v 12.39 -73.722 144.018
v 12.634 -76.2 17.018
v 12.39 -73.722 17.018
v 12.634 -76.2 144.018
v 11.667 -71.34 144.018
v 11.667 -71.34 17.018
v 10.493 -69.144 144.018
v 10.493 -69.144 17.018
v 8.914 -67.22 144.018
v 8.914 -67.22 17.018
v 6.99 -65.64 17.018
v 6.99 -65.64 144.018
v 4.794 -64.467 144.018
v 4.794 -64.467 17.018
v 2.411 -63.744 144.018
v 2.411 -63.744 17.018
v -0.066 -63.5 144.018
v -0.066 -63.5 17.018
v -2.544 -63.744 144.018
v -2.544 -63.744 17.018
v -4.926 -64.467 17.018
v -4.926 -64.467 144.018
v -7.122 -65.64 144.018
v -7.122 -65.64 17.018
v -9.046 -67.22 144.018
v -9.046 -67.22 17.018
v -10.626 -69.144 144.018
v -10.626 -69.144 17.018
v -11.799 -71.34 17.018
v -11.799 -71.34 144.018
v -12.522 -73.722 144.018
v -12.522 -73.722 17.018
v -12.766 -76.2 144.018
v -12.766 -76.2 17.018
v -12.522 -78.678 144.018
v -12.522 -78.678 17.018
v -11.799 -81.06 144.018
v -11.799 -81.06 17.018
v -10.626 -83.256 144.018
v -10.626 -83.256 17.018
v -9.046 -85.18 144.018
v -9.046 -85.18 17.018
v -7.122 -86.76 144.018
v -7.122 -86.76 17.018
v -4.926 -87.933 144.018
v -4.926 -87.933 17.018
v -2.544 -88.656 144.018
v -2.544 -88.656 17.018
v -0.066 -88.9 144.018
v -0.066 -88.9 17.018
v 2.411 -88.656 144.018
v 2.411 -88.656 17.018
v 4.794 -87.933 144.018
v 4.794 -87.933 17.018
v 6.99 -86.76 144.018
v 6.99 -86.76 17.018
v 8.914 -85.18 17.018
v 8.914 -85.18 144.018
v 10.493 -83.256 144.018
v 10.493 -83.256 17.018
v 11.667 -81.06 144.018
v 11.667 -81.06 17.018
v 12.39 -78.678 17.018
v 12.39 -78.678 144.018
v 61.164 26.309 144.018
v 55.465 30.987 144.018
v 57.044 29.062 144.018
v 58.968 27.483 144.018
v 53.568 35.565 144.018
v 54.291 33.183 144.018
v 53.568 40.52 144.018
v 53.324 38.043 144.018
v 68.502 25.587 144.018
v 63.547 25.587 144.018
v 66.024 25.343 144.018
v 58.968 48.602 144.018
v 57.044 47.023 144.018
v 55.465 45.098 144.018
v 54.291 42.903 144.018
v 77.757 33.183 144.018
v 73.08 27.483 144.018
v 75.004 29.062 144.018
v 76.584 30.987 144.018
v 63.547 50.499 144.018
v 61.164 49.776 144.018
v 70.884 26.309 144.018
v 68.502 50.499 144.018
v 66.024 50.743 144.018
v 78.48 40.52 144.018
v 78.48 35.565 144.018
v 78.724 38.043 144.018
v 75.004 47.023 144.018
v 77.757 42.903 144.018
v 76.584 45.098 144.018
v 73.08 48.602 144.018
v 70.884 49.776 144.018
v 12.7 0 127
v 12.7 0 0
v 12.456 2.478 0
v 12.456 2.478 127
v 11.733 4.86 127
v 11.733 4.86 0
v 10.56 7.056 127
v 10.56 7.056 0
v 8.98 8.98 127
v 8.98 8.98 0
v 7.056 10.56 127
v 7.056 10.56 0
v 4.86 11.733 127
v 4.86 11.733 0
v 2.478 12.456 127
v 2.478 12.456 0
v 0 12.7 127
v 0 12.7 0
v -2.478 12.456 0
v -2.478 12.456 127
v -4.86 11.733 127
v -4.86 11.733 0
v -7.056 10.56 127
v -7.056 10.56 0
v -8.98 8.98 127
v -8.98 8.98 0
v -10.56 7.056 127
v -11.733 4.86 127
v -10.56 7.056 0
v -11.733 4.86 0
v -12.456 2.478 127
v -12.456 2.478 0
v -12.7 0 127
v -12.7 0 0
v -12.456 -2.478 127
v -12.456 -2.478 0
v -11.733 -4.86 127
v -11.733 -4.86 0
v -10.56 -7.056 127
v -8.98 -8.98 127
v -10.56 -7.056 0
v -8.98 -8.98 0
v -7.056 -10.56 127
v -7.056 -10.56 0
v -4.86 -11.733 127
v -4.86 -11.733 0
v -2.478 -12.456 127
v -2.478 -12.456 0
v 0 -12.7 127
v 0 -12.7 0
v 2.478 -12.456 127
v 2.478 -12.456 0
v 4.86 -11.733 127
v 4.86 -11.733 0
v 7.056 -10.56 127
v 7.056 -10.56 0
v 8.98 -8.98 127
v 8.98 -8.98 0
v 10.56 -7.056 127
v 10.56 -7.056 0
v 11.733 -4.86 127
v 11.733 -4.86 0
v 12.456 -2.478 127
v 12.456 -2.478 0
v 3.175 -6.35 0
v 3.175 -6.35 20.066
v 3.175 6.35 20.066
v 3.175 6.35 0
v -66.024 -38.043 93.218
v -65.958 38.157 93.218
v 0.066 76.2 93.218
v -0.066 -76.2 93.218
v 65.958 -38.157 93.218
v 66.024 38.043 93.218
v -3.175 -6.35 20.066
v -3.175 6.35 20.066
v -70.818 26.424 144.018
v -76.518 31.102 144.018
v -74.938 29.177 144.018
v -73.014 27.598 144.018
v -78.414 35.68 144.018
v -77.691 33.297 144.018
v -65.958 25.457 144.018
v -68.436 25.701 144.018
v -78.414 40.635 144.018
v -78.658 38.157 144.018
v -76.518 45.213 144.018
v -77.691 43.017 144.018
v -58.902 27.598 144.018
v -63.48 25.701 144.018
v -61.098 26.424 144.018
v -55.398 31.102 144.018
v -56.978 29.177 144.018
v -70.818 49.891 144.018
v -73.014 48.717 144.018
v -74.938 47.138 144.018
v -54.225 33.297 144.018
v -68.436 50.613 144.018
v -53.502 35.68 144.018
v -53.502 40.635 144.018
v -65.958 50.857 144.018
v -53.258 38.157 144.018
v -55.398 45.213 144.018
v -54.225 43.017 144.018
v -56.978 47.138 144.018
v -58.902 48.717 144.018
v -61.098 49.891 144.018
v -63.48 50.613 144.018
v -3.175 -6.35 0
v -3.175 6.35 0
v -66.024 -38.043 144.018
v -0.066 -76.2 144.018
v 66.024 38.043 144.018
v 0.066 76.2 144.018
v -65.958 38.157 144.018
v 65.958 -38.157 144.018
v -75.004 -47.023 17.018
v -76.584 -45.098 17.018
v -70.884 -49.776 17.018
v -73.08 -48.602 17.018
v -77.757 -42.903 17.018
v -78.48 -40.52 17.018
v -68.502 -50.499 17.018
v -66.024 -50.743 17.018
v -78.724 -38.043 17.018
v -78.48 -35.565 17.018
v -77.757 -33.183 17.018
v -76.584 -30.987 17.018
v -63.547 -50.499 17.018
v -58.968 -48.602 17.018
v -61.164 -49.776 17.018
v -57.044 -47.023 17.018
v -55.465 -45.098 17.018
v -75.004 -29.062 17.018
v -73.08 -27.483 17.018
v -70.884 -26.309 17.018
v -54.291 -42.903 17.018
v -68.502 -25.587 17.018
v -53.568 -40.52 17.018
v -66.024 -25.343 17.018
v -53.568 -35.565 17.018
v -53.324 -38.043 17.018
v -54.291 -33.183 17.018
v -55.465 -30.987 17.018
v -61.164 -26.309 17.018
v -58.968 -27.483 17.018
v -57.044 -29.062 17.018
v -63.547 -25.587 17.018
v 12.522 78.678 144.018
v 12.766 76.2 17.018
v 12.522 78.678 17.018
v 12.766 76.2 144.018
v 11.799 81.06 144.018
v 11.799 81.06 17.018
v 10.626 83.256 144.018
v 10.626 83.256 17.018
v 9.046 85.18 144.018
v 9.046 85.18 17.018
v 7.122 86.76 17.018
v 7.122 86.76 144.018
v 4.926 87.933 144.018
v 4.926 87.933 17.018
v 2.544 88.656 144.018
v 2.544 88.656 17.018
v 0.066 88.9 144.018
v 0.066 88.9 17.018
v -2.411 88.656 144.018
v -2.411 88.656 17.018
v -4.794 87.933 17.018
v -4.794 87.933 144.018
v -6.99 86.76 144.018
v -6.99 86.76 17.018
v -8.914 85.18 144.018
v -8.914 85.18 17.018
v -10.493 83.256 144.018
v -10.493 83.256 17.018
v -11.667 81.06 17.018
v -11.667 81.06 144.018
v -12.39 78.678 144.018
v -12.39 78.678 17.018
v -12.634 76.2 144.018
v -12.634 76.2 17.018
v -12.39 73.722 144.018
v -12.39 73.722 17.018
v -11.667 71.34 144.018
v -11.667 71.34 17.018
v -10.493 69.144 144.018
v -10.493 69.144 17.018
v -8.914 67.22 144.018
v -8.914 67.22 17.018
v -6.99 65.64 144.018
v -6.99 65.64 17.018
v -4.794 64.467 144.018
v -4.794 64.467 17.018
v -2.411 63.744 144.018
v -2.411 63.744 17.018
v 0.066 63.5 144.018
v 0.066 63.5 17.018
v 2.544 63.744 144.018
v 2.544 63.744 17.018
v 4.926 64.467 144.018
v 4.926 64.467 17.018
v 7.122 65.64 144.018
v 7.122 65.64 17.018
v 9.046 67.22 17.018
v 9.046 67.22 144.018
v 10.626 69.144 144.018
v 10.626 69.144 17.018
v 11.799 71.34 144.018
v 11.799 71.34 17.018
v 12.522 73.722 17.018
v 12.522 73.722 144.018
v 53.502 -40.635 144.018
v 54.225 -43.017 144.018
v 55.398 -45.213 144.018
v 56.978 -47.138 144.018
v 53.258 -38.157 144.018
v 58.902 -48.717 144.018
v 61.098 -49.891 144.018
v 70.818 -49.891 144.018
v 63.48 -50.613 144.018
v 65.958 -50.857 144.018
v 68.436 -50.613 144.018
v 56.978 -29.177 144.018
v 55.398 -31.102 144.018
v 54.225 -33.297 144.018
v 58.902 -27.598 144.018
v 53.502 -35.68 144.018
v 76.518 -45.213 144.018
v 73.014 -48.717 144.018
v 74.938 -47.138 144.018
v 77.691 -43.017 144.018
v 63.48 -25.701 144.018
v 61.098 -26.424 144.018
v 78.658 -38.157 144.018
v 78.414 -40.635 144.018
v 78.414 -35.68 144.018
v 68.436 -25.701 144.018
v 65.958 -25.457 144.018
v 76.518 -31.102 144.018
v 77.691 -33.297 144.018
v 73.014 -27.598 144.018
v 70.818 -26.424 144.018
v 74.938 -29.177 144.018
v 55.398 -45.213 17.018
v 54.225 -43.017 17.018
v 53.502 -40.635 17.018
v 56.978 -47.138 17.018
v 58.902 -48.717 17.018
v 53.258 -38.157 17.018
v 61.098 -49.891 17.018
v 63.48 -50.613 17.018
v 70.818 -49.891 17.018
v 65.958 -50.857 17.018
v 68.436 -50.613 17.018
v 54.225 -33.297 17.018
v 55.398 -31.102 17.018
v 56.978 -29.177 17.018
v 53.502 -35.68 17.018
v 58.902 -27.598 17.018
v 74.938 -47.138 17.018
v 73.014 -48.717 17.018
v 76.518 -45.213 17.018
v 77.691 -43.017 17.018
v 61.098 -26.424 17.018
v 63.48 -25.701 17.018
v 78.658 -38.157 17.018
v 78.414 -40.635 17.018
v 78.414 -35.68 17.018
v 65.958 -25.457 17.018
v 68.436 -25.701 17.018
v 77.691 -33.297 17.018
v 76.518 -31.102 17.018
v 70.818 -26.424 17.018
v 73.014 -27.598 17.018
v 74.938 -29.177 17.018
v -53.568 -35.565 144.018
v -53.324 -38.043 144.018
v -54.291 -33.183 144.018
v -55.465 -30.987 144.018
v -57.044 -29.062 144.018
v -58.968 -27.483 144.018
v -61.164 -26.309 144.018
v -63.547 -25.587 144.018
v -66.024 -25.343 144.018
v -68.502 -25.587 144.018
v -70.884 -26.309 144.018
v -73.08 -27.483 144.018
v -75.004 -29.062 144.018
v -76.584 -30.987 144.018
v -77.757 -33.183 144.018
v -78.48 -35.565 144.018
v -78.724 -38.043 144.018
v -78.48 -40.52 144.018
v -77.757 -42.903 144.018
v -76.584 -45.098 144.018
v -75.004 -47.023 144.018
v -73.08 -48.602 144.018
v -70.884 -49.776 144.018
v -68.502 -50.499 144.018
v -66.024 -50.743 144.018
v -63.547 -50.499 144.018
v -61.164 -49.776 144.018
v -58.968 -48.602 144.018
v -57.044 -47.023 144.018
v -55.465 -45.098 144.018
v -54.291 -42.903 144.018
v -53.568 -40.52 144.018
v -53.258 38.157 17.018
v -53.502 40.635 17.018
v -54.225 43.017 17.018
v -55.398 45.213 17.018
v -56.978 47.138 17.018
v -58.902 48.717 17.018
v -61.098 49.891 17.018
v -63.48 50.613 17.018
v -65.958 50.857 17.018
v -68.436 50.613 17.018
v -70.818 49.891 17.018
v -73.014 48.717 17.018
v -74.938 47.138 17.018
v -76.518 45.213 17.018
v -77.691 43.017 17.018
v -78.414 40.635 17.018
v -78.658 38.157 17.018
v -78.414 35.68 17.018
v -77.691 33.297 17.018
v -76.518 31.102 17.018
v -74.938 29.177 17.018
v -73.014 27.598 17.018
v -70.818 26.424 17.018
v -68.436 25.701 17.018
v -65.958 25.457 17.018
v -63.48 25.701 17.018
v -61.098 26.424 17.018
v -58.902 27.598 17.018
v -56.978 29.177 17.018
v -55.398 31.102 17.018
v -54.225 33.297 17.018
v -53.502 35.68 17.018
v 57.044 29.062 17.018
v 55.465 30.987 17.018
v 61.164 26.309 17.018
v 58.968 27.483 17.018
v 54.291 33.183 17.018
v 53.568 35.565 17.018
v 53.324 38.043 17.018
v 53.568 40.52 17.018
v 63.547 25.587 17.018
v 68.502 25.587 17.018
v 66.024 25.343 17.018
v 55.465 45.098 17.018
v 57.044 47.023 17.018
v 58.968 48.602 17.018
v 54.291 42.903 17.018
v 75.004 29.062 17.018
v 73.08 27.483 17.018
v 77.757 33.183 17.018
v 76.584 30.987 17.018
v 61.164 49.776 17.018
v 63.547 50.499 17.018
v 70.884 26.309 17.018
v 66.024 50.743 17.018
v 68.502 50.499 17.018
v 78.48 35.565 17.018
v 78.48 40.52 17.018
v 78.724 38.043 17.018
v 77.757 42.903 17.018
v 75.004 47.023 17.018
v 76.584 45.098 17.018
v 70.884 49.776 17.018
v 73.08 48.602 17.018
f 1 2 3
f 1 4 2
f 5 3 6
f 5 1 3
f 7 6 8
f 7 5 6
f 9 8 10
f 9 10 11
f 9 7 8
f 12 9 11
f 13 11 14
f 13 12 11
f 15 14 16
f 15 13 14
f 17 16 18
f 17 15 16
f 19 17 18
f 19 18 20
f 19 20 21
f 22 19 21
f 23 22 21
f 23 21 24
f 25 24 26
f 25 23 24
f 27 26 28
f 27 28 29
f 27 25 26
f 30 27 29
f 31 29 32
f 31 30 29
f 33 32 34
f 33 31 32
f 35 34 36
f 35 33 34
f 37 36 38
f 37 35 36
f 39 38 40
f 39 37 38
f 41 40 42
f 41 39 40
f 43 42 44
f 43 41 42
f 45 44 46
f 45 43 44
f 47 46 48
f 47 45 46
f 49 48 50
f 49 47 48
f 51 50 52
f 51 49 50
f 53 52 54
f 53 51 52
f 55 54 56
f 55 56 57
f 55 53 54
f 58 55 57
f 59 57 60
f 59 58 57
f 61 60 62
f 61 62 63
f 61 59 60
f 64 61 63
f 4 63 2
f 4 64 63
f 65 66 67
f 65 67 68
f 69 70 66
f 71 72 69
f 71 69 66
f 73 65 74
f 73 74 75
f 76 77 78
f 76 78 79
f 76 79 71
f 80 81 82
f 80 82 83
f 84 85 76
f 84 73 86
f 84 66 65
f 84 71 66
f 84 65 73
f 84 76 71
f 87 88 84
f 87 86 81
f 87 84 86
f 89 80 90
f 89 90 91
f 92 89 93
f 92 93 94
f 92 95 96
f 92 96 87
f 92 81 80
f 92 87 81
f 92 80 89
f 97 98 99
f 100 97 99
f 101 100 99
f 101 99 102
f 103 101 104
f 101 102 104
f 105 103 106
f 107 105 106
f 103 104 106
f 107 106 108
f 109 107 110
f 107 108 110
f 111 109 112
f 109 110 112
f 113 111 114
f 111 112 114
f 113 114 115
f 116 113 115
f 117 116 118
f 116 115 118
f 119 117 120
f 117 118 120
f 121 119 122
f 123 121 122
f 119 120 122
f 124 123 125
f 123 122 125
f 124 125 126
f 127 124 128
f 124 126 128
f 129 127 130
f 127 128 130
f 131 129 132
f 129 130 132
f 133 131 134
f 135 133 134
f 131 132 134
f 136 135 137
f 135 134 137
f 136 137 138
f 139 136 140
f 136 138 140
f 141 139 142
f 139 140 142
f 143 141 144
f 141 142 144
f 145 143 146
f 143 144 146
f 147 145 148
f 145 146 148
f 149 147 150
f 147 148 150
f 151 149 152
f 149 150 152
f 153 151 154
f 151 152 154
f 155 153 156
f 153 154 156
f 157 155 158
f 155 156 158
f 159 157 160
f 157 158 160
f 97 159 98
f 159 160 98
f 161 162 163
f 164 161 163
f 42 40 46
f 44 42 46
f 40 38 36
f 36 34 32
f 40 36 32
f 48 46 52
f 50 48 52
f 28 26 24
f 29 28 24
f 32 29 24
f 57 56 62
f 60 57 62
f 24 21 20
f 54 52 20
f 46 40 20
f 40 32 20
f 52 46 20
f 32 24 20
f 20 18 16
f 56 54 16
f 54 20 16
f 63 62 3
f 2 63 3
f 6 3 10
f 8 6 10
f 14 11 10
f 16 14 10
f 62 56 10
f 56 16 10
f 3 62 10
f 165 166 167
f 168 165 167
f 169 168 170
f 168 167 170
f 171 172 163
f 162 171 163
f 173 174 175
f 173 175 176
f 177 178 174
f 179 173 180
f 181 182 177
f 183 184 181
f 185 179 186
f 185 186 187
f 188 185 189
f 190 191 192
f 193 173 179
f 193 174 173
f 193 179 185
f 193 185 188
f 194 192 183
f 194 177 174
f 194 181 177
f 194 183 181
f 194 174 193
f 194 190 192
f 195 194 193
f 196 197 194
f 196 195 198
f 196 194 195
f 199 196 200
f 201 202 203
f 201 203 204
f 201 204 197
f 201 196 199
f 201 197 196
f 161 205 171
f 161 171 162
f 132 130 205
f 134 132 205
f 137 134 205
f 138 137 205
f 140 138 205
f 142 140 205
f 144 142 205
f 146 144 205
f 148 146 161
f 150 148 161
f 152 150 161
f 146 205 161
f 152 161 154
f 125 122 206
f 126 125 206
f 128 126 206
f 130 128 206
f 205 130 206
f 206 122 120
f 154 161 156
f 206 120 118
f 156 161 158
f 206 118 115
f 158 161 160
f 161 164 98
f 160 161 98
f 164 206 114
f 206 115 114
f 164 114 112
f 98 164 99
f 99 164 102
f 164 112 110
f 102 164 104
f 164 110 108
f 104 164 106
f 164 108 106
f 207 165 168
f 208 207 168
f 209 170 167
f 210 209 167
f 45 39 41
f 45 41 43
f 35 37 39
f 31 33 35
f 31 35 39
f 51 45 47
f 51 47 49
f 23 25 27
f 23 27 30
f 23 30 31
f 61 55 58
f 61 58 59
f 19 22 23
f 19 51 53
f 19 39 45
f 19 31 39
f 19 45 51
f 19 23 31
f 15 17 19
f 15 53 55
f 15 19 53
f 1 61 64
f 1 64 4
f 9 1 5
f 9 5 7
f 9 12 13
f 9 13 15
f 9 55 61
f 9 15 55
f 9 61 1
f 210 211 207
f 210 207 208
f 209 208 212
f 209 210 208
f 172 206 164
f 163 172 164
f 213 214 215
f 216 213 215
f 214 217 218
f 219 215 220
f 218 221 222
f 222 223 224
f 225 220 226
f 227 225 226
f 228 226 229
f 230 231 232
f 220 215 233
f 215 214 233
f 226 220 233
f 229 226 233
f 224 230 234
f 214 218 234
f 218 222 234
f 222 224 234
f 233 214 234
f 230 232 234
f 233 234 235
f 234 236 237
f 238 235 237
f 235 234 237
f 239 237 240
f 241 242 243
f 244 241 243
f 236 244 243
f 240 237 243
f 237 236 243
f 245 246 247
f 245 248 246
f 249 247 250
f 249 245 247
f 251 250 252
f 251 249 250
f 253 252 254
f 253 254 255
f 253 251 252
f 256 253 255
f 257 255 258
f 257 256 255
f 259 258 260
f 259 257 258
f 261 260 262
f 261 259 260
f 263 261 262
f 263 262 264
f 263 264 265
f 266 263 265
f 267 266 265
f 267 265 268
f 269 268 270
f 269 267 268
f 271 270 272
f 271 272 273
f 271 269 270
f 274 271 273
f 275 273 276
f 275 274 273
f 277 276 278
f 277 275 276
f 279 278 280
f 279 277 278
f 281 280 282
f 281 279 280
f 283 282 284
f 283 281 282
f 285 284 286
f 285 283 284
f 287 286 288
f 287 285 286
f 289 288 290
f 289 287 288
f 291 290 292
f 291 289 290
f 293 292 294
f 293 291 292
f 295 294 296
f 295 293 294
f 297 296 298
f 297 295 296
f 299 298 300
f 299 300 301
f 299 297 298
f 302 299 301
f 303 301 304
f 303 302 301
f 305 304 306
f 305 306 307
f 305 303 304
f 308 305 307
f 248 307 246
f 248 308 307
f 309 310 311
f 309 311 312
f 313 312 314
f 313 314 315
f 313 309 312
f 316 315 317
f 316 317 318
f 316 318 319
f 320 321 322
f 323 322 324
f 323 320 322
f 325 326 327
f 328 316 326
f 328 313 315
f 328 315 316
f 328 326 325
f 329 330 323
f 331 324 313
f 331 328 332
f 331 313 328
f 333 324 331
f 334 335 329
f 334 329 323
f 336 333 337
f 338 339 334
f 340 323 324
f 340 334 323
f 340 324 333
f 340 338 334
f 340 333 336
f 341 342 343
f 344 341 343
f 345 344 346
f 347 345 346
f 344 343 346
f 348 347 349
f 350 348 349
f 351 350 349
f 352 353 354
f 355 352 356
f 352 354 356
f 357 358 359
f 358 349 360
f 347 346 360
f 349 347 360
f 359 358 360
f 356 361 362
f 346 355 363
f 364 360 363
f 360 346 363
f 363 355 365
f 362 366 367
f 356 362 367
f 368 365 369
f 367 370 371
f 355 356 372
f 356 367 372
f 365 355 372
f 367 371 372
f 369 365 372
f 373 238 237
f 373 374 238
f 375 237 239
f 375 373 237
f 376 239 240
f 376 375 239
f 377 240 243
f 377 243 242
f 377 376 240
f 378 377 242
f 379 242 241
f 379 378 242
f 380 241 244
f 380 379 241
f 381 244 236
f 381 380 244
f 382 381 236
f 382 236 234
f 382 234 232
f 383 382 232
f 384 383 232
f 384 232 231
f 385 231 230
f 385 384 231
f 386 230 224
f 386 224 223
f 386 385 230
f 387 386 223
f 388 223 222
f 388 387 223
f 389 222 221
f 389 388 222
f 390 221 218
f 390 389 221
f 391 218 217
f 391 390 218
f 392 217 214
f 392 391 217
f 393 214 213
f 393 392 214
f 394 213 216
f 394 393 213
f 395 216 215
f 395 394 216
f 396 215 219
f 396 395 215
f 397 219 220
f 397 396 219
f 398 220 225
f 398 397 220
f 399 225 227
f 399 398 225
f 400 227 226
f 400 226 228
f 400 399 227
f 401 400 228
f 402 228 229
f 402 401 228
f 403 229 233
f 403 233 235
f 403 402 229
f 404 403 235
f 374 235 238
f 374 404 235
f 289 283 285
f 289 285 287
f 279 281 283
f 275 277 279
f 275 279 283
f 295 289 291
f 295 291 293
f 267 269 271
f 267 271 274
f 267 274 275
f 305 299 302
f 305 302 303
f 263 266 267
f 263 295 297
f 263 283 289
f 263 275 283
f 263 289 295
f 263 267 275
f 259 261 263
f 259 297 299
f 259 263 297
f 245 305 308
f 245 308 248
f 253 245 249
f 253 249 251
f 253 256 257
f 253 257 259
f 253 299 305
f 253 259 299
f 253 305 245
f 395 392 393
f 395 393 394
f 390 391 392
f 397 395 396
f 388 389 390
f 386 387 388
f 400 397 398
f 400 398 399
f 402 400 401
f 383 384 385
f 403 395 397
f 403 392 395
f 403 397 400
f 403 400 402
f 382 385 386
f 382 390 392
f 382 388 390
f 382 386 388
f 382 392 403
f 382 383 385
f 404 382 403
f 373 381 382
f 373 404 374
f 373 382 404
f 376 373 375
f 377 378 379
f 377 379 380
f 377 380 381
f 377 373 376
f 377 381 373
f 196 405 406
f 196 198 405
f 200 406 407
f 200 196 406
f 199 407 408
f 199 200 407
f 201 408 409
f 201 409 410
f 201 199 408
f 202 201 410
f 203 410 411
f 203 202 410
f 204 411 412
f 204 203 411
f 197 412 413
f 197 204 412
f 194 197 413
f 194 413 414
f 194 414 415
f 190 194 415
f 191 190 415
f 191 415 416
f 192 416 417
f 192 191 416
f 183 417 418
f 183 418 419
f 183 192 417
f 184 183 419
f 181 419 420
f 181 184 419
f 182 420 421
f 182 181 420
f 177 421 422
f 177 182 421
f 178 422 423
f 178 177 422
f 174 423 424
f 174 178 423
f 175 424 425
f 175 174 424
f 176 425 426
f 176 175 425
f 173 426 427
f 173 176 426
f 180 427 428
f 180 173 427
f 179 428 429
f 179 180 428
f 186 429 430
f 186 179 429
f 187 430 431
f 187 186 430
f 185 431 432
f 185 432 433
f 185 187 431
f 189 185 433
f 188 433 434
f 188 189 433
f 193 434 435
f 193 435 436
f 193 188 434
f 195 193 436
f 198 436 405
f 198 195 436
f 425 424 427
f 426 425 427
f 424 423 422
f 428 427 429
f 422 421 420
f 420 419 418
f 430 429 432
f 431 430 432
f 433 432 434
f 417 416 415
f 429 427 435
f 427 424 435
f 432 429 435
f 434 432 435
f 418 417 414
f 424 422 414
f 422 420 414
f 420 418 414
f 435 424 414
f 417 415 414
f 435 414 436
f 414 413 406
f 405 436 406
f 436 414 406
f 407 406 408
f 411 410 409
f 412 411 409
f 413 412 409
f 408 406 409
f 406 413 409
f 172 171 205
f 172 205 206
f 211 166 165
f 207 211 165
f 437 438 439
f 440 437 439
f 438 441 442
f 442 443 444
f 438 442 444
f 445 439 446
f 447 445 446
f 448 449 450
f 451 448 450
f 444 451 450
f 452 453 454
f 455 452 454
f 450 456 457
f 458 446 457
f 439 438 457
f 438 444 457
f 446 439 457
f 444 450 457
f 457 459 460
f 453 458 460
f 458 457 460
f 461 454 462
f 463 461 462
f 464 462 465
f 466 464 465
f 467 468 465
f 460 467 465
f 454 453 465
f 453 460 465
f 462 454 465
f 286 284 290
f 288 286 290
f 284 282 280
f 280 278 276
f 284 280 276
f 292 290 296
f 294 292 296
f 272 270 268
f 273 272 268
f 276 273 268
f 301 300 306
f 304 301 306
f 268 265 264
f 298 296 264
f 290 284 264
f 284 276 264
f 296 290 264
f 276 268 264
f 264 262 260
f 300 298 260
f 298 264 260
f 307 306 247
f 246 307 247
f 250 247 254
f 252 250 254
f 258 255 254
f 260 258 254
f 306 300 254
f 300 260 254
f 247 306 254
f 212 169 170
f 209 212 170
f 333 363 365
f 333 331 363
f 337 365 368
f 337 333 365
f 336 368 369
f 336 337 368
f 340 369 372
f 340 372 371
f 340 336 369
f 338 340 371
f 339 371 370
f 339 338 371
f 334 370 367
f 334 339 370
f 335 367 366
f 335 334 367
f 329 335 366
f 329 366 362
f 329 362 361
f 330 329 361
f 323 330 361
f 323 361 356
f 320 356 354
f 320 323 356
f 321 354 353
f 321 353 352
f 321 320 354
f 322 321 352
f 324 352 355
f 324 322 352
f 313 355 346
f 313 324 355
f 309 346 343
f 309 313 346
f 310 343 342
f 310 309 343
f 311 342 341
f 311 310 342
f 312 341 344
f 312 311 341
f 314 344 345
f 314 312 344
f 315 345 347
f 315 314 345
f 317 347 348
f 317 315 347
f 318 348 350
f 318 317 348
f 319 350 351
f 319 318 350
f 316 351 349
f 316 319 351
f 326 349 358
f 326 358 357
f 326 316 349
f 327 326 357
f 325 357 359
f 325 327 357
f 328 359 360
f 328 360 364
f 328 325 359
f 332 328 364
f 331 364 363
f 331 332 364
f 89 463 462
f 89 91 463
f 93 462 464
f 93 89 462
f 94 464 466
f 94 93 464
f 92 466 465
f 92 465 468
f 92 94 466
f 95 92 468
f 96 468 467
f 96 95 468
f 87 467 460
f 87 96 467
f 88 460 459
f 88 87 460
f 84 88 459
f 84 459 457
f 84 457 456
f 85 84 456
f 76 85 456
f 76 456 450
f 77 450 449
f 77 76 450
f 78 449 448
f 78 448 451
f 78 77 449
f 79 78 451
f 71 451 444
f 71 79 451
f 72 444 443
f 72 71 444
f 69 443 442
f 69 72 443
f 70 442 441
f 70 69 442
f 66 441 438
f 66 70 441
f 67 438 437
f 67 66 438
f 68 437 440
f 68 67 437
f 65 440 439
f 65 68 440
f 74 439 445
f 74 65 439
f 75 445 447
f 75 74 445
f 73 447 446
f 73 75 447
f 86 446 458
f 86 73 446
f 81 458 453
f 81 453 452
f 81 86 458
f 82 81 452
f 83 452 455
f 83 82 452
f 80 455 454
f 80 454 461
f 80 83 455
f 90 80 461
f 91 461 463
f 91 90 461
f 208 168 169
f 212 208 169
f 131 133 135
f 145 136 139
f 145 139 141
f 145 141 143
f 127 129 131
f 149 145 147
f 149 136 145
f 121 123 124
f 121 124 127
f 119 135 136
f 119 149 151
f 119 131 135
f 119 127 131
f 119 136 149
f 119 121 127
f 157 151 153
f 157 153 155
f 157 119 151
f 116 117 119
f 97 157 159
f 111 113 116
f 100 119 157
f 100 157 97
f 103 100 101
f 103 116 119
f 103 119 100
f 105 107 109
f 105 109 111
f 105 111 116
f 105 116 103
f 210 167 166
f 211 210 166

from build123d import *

# Parameters (mm, degrees)
F0_R          = 12.7
F1_DEPTH      = 127
F2_W          = 6.35
F2_H          = 12.7
F3_DEPTH      = 20.066
F6_R          = 12.7
F7_DEPTH      = 50.8
F7_DEPTH_BACK = 76.2
F8_DEPTH      = 50.8


with BuildPart() as f1:
    # F0 (on Top) → F1 (new body)
    with BuildSketch(Plane.XY):
        Circle(F0_R)
    extrude(amount=F1_DEPTH)

    # F2 (on Top) → F3 (cut)
    with BuildSketch(Plane.XY):
        Rectangle(F2_W, F2_H)
    extrude(amount=F3_DEPTH, mode=Mode.SUBTRACT)


with BuildPart() as f7:
    # F6 (on offset) → F7 (new body, two sides)
    with BuildSketch(Plane.XY.offset(93.218)) as f7_sk:
        with Locations((65.958012, -38.157315)):
            Circle(F6_R)
        with Locations((-0.066198, -76.199971)):
            Circle(F6_R)
        with Locations((-66.02421, -38.042656)):
            Circle(F6_R)
        with Locations((-65.958012, 38.157315)):
            Circle(F6_R)
        with Locations((0.066198, 76.199971)):
            Circle(F6_R)
        with Locations((66.02421, 38.042656)):
            Circle(F6_R)
    extrude(amount=F7_DEPTH)
    extrude(f7_sk.sketch, amount=-F7_DEPTH_BACK)


with BuildPart() as f8:
    # F5 (on offset) → F8 (new body)
    with BuildSketch(Plane.XY.offset(93.218)):
        Polygon((-0.066198, -76.199971), (65.958012, -38.157315), (66.02421, 38.042656), (0.066198, 76.199971), (-65.958012, 38.157315), (-66.02421, -38.042656), align=None)
    extrude(amount=F8_DEPTH)


solid = Compound([f1.part, f7.part, f8.part])
